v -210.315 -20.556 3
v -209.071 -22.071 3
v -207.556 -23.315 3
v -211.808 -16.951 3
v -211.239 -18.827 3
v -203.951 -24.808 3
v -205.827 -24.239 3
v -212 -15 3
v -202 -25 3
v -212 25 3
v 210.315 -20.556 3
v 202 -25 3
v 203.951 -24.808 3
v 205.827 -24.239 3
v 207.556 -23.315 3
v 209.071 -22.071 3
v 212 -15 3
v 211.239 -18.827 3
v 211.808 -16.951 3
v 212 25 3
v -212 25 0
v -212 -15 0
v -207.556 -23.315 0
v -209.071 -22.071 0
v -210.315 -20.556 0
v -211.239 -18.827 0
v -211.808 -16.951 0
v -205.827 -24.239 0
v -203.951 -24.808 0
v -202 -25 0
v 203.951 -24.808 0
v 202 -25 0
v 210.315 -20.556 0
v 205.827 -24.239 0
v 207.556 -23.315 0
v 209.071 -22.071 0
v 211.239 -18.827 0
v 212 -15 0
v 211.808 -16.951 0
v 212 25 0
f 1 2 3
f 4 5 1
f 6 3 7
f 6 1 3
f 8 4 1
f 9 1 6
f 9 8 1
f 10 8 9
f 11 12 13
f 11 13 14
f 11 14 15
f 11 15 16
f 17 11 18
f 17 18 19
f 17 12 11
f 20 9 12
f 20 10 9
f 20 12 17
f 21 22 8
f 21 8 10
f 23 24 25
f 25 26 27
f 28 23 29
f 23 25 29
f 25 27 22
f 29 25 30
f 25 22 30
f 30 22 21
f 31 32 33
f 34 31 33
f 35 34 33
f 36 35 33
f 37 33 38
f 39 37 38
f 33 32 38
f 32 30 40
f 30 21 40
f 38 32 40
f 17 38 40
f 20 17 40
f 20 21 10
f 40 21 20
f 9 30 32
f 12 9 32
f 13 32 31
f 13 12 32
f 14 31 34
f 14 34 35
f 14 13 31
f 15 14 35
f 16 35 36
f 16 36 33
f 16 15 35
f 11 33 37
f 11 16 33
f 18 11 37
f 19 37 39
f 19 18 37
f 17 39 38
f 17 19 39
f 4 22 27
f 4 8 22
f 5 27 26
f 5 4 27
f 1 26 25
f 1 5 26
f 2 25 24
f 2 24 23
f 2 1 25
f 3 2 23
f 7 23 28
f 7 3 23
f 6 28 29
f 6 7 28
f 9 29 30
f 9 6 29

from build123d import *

# Parameters (mm, degrees)
SKETCH_1_W      = 424
SKETCH_1_H      = 50
EXTRUDE_1_DEPTH = 3
FILLET_1_R      = 10


with BuildPart() as part:
    # Эскиз1 → Бобышка-Вытянуть1 (new body)
    with BuildSketch(Plane.XY):
        Rectangle(SKETCH_1_W, SKETCH_1_H)
    extrude(amount=EXTRUDE_1_DEPTH)

    # Скругление1
    fillet_1_edges = [part.edges().sort_by_distance(p)[0] for p in [
        (212, -25, 1.5),
        (-212, -25, 1.5),
    ]]
    fillet(fillet_1_edges, radius=FILLET_1_R)


solid = part.part
